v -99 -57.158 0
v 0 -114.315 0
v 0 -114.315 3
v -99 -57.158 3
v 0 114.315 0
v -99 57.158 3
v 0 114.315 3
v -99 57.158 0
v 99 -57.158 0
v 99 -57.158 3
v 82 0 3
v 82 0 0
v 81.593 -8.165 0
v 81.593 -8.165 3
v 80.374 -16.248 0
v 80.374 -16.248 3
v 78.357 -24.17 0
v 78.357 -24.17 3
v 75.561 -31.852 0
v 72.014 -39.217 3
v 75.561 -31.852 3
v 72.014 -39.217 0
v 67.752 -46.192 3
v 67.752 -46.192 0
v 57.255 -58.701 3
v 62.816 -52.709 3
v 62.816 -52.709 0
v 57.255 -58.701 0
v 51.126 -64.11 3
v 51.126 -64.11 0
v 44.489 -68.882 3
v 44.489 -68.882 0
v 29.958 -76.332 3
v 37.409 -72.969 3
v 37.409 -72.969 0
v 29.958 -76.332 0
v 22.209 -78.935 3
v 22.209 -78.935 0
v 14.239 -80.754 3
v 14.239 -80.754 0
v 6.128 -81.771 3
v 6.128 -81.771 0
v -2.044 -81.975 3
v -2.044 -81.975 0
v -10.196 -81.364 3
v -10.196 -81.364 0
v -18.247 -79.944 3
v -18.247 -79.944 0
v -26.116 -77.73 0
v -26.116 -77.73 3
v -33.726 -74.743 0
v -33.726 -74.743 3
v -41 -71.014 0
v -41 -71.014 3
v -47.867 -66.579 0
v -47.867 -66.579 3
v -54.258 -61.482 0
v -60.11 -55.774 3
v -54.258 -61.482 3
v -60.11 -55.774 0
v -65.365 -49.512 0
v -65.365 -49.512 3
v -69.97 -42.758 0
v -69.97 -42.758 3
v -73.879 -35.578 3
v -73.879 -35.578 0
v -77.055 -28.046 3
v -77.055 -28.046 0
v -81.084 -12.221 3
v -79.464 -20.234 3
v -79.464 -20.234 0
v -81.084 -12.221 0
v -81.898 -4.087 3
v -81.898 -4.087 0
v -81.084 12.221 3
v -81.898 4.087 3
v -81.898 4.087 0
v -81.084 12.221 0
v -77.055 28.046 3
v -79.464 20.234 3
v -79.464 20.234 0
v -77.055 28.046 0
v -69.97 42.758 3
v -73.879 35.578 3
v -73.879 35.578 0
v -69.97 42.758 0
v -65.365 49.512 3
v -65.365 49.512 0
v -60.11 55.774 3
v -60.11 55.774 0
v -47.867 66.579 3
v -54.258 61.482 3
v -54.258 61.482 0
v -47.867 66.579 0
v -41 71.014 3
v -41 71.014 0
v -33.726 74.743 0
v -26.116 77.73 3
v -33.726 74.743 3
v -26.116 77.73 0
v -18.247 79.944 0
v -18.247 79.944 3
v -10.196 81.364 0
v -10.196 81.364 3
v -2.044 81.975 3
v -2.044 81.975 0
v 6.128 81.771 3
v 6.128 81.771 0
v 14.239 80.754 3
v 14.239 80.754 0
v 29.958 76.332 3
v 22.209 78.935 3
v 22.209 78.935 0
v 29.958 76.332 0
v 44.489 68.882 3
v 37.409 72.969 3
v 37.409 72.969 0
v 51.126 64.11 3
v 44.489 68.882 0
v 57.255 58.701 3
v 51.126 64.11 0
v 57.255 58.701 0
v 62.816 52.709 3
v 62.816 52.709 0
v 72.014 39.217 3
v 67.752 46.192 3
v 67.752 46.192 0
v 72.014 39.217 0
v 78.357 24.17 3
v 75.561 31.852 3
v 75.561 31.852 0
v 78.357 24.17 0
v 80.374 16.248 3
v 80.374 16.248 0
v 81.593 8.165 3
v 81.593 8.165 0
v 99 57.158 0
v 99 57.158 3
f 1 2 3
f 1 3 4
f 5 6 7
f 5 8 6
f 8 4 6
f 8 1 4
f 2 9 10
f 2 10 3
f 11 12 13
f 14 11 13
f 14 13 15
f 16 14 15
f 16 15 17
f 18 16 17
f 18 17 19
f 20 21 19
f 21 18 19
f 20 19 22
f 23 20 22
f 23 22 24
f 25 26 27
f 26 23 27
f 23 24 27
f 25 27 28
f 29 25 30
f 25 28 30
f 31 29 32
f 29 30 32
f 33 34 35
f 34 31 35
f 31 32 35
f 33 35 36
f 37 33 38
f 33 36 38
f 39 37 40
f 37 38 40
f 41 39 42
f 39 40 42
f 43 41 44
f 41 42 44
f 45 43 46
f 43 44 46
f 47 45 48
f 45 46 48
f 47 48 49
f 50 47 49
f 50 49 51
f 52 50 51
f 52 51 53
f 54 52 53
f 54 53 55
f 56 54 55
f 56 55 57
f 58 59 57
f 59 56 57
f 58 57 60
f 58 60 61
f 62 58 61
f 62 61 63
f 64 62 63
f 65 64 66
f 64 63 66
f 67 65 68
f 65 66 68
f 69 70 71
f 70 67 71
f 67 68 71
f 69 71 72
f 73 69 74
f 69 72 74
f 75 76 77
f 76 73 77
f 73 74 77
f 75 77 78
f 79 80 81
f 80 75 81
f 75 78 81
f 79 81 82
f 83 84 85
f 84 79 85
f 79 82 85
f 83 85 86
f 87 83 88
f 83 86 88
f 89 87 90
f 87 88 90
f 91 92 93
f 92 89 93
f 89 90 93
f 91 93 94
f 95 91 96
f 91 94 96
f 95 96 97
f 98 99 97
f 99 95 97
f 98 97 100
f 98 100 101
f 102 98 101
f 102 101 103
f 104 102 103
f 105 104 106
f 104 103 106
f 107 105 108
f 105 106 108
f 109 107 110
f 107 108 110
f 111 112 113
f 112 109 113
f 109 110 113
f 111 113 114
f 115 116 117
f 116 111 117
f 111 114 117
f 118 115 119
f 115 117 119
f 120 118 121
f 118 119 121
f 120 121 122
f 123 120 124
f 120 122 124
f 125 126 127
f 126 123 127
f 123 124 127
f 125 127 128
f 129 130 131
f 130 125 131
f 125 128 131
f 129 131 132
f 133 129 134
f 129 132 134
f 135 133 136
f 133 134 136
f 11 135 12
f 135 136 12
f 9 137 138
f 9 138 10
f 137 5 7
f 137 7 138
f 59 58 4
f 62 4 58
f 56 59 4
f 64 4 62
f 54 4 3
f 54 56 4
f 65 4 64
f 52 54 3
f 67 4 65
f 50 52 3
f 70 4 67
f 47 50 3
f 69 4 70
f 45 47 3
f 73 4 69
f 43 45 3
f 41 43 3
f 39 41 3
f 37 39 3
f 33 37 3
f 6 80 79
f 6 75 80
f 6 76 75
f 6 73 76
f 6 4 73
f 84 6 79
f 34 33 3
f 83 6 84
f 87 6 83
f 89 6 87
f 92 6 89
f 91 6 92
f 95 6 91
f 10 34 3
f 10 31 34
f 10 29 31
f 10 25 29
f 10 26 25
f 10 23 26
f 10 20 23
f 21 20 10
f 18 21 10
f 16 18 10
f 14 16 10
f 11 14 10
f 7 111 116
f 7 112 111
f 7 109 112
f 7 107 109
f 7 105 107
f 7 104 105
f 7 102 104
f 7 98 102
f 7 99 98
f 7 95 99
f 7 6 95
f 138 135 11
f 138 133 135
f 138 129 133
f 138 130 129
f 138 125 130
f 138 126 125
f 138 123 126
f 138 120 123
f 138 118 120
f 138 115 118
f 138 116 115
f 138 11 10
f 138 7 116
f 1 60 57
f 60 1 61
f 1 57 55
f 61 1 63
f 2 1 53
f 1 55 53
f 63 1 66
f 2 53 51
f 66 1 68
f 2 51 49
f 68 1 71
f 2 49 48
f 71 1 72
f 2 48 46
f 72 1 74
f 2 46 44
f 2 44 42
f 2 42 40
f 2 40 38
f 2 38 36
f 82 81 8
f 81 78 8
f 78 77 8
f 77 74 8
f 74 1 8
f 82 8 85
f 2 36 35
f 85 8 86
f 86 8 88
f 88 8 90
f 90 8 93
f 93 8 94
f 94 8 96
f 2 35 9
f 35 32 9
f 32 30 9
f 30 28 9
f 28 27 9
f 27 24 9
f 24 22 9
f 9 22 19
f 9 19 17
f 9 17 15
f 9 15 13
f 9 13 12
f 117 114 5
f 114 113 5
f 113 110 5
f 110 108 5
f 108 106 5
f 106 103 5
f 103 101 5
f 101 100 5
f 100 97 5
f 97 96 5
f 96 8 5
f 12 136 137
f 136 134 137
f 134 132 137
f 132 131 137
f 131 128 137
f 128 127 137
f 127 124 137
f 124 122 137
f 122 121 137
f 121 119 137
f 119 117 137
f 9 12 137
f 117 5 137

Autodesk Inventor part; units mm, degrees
ref_plane "YZ Plane" through (0, 0, 0) normal (1, 0, 0) x (0, 1, 0)
ref_plane "XZ Plane" through (0, 0, 0) normal (0, 1, 0) x (-1, 0, 0)
ref_plane "XY Plane" through (0, 0, 0) normal (0, 0, 1) x (1, 0, 0)
sketch "Sketch8" plane through (0, 0, 0) normal (0, 0, 1) x (1, 0, 0)
  circle A0 centre (0, 0) radius 82
  line L0 (99, -57.1577) -> (0, -114.3154)
  line L1 (0, -114.3154) -> (-99, -57.1577)
  line L2 (-99, -57.1577) -> (-99, 57.1577)
  line L3 (-99, 57.1577) -> (0, 114.3154)
  line L4 (0, 114.3154) -> (99, 57.1577)
  line L5 (99, 57.1577) -> (99, -57.1577)
  dimension "d44" = 164
  dimension "d47" = 198
extrude "Plate3" add sketch "Sketch8" along normal blind 3
equation "\"d48\" = Thickness"
equation "\"BendRadius\" = Thickness"
equation "\"BendReliefWidth\" = Thickness"
equation "\"BendReliefDepth\" = 0.5 * Thickness"
equation "\"CornerReliefSize\" = 4 * Thickness"
equation "\"MinimumRemnant\" = 2 * Thickness"
equation "\"TransitionRadius\" = BendRadius"
equation "\"JacobiRadiusSize\" = BendRadius"
equation "\"GapSize\" = Thickness"
equation "\"Octaeder_side\" = d41"
equation "\"Octaeder_flange_lenth\" = d42"
equation "\"Thickness\" = 3"
equation "\"d41\" = 55.918831"
equation "\"d42\" = 72.5"
properties part number "DSB 121 drain system reduce flange"
